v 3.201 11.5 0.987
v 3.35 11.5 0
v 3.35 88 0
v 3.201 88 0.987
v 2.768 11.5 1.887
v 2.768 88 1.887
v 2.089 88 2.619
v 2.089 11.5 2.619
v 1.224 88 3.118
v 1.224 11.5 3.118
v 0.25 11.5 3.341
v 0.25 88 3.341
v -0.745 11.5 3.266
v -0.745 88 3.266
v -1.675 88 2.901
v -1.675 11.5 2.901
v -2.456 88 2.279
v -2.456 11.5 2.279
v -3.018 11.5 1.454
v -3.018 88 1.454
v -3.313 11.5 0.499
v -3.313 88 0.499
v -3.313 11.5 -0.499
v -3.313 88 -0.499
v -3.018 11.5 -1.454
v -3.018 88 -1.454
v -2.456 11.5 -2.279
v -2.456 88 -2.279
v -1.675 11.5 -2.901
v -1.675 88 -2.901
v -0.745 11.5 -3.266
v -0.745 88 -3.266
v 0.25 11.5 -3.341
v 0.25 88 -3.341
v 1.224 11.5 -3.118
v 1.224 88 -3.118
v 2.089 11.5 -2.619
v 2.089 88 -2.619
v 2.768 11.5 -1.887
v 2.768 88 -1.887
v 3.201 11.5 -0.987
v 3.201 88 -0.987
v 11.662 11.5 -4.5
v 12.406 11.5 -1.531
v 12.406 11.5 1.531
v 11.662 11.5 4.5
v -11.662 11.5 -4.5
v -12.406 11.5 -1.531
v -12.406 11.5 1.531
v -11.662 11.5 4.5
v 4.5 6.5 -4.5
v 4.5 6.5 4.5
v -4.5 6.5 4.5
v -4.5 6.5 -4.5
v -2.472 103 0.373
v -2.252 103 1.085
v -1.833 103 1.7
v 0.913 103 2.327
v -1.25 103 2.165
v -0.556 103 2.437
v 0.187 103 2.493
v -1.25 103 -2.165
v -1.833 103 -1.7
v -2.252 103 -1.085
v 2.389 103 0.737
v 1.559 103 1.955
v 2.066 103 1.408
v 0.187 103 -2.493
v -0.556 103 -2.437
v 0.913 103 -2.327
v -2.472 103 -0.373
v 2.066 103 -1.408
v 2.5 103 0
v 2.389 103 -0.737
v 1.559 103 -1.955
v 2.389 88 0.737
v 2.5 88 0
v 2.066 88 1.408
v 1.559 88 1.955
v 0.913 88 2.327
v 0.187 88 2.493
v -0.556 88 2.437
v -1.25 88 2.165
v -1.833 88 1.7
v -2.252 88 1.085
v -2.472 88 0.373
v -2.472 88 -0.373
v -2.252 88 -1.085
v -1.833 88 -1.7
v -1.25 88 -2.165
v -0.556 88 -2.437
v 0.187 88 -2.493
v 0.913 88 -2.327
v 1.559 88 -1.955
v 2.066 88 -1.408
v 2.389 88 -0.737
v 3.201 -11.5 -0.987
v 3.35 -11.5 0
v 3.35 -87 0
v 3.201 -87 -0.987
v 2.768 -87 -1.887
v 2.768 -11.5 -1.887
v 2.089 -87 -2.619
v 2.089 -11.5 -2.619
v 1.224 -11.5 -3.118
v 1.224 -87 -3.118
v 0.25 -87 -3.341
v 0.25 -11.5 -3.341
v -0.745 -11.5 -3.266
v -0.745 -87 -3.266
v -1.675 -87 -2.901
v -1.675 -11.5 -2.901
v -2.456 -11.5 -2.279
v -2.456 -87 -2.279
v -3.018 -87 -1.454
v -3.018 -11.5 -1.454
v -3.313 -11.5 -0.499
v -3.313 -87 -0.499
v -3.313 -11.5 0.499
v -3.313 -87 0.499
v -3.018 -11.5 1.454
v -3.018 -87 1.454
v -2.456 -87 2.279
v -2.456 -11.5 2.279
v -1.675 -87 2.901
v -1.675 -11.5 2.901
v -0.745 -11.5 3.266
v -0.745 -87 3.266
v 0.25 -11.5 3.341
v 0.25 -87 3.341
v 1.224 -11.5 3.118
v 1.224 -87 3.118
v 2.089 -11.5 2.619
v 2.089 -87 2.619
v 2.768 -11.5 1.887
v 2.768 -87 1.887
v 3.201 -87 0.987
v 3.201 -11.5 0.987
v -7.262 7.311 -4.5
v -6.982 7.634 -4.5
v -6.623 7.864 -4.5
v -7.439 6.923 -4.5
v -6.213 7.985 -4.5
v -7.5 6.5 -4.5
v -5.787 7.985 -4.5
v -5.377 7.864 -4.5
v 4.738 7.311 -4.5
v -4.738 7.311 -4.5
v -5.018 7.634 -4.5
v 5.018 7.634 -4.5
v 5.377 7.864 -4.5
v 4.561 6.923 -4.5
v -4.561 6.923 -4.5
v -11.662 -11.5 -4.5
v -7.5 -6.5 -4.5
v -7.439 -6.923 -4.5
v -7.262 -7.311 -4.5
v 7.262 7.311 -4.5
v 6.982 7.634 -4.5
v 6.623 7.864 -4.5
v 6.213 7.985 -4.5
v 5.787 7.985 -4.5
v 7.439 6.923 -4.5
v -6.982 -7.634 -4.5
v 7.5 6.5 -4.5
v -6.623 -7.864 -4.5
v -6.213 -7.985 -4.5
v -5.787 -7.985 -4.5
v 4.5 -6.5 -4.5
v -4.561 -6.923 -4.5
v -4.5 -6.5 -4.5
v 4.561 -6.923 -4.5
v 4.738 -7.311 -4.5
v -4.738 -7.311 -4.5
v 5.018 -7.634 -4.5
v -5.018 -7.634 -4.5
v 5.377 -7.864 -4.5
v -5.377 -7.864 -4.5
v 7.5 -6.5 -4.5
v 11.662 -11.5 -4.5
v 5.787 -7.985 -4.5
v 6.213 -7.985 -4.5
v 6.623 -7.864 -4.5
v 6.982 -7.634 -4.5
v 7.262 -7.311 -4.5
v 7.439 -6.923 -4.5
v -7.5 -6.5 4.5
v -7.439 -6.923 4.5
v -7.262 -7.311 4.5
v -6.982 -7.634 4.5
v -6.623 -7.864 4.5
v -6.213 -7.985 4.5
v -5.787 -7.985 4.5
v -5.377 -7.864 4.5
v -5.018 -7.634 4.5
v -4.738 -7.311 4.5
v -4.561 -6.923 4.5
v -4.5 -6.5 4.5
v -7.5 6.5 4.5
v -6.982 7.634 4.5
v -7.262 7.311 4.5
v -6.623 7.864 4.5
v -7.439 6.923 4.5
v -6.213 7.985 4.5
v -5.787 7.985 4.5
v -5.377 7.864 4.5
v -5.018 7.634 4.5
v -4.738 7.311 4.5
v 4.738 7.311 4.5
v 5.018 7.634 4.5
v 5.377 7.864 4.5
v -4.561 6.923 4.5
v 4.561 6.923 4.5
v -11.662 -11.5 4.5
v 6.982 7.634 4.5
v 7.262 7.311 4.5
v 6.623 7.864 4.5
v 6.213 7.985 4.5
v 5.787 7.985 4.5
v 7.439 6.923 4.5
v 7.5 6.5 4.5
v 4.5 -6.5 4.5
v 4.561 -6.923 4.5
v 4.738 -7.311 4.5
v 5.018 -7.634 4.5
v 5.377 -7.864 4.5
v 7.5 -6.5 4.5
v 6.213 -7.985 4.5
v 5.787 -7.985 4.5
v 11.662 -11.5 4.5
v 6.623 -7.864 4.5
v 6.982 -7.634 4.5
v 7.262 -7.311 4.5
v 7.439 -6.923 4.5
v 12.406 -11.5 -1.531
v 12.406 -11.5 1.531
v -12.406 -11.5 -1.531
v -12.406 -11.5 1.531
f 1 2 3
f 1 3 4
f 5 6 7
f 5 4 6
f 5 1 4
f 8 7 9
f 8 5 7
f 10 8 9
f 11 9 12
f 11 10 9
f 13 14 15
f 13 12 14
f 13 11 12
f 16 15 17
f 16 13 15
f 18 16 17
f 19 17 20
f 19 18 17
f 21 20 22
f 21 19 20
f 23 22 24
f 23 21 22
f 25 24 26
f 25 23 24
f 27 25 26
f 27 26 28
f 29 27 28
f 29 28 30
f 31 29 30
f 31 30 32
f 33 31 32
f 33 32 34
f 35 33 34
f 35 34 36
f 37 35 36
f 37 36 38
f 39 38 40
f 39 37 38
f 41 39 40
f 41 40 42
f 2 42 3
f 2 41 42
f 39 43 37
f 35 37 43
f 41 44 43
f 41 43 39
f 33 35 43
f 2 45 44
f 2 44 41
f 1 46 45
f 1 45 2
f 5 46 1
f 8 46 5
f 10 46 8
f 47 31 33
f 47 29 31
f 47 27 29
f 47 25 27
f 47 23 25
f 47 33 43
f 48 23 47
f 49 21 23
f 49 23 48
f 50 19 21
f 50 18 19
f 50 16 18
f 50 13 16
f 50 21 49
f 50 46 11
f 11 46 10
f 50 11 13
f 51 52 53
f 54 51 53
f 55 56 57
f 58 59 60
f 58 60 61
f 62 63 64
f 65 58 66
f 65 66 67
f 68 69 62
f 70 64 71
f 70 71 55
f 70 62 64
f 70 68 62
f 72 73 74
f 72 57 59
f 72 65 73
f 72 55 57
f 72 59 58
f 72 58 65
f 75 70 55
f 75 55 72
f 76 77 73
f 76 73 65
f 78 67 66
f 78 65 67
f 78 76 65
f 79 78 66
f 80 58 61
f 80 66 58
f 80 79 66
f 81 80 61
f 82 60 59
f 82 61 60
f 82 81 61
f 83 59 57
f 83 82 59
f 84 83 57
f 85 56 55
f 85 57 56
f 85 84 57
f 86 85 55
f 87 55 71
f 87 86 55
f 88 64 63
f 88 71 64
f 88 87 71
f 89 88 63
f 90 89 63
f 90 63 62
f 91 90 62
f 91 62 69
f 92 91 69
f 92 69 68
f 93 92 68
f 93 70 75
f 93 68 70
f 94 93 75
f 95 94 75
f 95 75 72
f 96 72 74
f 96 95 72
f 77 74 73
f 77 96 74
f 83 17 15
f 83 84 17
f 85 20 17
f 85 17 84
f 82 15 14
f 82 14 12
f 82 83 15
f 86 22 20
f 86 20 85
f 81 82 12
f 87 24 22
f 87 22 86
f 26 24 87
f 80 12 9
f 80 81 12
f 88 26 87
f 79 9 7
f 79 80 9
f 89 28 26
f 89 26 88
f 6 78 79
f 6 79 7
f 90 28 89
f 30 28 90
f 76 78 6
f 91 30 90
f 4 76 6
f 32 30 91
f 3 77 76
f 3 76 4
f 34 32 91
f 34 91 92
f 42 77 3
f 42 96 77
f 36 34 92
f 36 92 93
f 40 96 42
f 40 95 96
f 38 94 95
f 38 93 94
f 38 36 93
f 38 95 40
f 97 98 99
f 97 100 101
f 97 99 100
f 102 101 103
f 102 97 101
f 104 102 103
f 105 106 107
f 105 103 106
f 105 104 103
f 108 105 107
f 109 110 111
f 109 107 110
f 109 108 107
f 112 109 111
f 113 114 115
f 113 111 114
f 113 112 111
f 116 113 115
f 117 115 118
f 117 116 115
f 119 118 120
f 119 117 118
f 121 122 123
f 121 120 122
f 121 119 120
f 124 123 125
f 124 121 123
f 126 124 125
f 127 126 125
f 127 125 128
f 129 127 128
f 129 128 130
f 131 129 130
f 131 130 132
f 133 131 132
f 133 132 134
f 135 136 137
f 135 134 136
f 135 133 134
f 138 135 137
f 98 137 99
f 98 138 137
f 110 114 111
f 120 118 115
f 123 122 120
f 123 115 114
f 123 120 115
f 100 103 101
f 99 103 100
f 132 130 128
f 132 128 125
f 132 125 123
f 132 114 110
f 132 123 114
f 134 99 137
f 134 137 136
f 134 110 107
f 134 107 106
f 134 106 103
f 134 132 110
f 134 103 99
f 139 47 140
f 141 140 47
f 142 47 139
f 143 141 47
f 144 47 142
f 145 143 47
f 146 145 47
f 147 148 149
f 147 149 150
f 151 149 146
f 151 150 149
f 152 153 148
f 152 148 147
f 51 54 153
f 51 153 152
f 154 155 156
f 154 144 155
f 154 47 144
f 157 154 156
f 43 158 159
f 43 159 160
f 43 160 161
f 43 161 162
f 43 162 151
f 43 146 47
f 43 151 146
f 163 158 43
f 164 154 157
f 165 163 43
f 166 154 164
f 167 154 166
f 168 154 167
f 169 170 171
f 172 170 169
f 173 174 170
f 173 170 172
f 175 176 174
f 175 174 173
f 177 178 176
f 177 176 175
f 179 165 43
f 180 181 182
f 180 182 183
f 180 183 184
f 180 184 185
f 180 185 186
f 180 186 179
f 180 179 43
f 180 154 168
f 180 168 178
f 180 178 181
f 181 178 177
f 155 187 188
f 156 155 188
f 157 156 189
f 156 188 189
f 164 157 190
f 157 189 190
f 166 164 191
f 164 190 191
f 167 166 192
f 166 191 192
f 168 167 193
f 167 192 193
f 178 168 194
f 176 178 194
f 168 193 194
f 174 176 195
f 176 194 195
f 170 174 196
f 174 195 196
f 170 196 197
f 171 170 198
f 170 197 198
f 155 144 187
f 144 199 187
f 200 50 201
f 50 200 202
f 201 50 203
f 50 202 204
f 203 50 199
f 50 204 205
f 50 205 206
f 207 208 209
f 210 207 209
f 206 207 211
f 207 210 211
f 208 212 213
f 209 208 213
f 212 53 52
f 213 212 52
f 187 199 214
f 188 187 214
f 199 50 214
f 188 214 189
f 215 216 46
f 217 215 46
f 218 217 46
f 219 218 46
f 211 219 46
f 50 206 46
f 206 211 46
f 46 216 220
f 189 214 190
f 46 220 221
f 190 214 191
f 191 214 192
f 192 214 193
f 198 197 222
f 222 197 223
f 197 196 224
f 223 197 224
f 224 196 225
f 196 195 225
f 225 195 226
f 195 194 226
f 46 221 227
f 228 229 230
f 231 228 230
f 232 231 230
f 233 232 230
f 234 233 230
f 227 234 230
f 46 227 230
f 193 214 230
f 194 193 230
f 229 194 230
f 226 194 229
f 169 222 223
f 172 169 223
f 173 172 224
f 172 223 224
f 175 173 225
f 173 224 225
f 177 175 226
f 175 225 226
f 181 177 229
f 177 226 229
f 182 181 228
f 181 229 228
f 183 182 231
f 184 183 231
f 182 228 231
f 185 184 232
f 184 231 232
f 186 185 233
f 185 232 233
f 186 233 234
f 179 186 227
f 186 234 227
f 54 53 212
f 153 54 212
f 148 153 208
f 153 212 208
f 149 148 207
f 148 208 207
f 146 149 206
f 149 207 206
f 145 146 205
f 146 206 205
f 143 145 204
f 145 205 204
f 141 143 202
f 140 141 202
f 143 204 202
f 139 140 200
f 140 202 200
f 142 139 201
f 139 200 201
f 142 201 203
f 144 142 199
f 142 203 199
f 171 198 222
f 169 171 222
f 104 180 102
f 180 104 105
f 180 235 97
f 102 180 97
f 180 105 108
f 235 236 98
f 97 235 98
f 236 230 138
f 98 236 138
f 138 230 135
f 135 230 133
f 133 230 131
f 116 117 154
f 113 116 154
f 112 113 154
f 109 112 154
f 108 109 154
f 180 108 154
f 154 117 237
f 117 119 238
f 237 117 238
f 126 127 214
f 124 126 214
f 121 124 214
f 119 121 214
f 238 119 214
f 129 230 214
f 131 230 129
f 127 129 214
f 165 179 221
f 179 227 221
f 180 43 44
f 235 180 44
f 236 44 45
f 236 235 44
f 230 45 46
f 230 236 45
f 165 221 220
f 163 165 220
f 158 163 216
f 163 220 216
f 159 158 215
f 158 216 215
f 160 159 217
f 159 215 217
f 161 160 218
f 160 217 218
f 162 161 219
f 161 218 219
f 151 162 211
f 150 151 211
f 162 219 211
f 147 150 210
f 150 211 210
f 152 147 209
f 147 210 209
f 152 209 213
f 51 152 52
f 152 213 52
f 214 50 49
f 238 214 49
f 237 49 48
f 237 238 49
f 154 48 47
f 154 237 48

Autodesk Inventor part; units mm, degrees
ref_plane "YZ Plane" through (0, 0, 0) normal (1, 0, 0) x (0, 1, 0)
ref_plane "XZ Plane" through (0, 0, 0) normal (0, 1, 0) x (-1, 0, 0)
ref_plane "XY Plane" through (0, 0, 0) normal (0, 0, 1) x (1, 0, 0)
sketch "Sketch1" plane through (0, 0, 0) normal (0, 1, 0) x (-1, 0, 0)
  line L0 (12.5, 0) -> (12.5, 4.5) construction
  line L1 (12.5, 4.5) -> (12.5, -4.5) construction
  line L2 (11.6619, 4.5) -> (-11.6619, 4.5)
  line L3 (11.6619, -4.5) -> (-11.6619, -4.5)
  arc A0 (11.6619, -4.5) -> (11.6619, 4.5) centre (0, 0) ccw
  arc A1 (-11.6619, 4.5) -> (-11.6619, -4.5) centre (0, 0) ccw
  dimension "d1" = 4.5
  dimension "d2" = 9
extrude "Extrusion1" add sketch "Sketch1" along normal mid plane 23
sketch "Sketch2" plane through (-11.6619, -11.5, 4.5) normal (0, 0, 1) x (1, 0, 0)
  line L0 (7.1619, 5) -> (16.1619, 5)
  line L1 (19.1619, 5) -> (19.1619, 18)
  line L2 (4.1619, 18) -> (4.1619, 5)
  line L3 (11.6619, 11.5) -> (19.1619, 18) construction
  line L4 (19.1619, 5) -> (11.6619, 11.5) construction
  line L5 (4.1619, 5) -> (5.6619, 5) construction
  arc A0 (4.1619, 5) -> (7.1619, 5) centre (5.6619, 5) ccw
  line L6 (4.1619, 18) -> (5.6619, 18) construction
  arc A1 (7.1619, 18) -> (4.1619, 18) centre (5.6619, 18) ccw
  line L7 (19.1619, 5) -> (17.6619, 5) construction
  arc A2 (16.1619, 5) -> (19.1619, 5) centre (17.6619, 5) ccw
  arc A3 (17.6619, 6.5) -> (17.4487, 6.4848) centre (17.6619, 5) ccw
  arc A4 (19.1619, 18) -> (16.1619, 18) centre (17.6619, 18) ccw
  arc A5 (17.4487, 16.5152) -> (17.6619, 16.5) centre (17.6619, 18) ccw
  line L8 (16.1619, 18) -> (7.1619, 18)
  dimension "d8" = 1.5
extrude "Extrusion2" cut sketch "Sketch2" against normal through all
sketch "Sketch3" plane through (0, -11.5, 0) normal (0, -1, 0) x (1, 0, 0)
  circle A0 centre (0, 0) radius 3.35
  dimension "d11" = 6.7
extrude "Extrusion3" add sketch "Sketch3" along normal blind 75.5
sketch "Sketch4" plane through (0, 11.5, 0) normal (0, 1, 0) x (1, 0, 0)
  circle A0 centre (0, 0) radius 3.35
  dimension "d14" = 6.7
extrude "Extrusion4" add sketch "Sketch4" along normal blind 76.5
sketch "Sketch5" plane through (0, 88, 0) normal (0, 1, 0) x (1, 0, 0)
  circle A0 centre (0, 0) radius 2.5
  dimension "d17" = 5
extrude "Extrusion5" add sketch "Sketch5" along normal blind 15
thread "Thread1" size "M5x0.8" class "6g" standard "ANSI Metric M Profile" length 9
properties part number "Asta pistone"
